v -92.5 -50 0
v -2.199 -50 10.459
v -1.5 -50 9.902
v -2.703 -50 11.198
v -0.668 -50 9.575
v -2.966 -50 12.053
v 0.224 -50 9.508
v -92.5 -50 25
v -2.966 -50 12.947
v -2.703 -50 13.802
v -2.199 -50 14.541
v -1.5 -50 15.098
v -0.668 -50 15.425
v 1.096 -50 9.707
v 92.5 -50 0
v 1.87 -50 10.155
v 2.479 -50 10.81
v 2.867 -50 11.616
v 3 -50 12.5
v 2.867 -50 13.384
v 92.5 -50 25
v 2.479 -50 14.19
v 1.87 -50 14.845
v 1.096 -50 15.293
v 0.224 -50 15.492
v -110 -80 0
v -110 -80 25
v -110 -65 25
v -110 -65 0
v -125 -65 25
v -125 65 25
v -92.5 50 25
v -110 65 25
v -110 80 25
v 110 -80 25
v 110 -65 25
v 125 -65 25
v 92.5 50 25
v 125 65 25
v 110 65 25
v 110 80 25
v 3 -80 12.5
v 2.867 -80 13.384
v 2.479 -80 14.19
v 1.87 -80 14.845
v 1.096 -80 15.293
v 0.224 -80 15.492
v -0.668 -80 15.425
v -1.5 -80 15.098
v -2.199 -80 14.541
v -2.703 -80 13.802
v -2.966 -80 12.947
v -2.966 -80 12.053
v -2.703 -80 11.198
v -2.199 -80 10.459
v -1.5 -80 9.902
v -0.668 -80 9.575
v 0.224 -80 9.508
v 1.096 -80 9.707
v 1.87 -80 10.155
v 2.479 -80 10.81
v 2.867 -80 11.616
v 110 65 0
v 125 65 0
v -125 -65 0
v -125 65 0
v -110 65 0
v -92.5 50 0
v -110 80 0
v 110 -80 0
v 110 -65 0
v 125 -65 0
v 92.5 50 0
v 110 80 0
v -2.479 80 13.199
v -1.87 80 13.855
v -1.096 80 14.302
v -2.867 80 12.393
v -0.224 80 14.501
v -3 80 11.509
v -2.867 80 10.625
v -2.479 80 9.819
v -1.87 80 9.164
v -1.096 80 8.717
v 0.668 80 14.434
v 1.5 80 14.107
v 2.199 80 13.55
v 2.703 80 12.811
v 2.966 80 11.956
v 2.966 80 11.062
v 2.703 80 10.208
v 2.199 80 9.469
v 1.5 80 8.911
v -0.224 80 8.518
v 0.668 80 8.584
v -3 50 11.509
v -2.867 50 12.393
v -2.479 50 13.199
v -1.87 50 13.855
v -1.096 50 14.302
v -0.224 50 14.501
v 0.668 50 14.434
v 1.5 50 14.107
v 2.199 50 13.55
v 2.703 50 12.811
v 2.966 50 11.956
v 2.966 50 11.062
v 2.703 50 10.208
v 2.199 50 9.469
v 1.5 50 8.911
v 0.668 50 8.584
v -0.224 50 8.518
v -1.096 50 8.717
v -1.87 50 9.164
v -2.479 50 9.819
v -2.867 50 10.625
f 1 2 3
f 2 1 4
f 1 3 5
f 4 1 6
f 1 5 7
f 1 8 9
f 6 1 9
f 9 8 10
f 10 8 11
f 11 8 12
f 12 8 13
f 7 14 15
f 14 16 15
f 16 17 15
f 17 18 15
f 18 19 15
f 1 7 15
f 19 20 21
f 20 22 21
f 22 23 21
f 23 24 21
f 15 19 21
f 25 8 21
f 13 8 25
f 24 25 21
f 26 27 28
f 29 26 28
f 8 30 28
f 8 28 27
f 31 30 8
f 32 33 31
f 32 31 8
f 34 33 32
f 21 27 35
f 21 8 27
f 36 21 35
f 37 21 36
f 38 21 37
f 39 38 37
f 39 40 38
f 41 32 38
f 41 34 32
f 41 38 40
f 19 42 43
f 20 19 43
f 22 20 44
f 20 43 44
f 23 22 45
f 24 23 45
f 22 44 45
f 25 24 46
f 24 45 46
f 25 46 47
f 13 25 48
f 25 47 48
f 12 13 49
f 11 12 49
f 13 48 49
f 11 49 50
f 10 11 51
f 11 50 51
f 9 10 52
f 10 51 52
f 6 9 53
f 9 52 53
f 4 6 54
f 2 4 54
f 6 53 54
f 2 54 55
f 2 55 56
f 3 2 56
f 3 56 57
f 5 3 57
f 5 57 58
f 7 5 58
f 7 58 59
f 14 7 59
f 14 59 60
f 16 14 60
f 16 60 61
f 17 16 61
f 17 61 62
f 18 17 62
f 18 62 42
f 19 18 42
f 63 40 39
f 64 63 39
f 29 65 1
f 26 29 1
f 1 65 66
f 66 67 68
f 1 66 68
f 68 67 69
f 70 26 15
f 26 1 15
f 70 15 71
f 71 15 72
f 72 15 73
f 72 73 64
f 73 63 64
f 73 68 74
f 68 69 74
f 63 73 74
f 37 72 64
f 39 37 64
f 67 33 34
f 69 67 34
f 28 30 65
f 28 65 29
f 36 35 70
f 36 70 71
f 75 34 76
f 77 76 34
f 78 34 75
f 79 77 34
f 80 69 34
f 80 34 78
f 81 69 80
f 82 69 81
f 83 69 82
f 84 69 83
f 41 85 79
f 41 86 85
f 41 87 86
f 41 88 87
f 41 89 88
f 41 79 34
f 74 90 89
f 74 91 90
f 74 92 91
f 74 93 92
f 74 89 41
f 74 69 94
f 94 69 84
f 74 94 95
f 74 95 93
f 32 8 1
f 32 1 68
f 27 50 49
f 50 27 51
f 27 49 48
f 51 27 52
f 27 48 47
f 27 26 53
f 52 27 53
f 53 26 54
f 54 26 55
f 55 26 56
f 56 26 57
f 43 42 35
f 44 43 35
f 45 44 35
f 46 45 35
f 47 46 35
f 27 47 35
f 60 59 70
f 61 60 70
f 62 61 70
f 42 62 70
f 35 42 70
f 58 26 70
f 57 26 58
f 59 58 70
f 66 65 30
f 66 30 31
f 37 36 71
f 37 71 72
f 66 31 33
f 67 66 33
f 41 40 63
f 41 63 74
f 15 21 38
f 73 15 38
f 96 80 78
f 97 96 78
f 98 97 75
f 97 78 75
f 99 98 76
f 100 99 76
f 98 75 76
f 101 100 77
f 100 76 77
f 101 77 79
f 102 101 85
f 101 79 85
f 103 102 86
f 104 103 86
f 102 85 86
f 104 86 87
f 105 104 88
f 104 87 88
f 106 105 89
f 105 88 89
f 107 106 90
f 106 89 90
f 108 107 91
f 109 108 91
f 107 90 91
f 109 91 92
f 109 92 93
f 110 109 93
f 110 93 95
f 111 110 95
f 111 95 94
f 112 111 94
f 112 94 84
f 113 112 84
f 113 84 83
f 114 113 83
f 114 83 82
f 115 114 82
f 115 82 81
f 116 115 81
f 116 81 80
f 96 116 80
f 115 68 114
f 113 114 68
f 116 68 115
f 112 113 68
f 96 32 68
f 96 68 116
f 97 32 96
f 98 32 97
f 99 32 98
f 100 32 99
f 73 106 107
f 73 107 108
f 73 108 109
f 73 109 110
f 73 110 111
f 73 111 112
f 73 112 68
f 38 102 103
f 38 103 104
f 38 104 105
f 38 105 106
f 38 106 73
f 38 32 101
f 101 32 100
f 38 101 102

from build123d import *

# Parameters (mm, degrees)
F0_W     = 250
F0_H     = 160
F1_DEPTH = 25
F2_W     = 15
F2_H     = 15
F3_DEPTH = 25
F4_W     = 185
F4_H     = 100
F5_DEPTH = 25
F6_R     = 3
F7_DEPTH = 40
F8_R     = 3
F9_DEPTH = 40


with BuildPart() as f1:
    # F0 (on Top) → F1 (new body)
    with BuildSketch(Plane.XY):
        Rectangle(F0_W, F0_H)
    extrude(amount=F1_DEPTH)

    # F2 (on face) → F3 (cut)
    with BuildSketch(Plane.XY.offset(25)):
        with Locations((-117.5, 72.5)):
            Rectangle(F2_W, F2_H)
        with Locations((117.5, 72.5)):
            Rectangle(F2_W, F2_H)
        with Locations((117.5, -72.5)):
            Rectangle(F2_W, F2_H)
        with Locations((-117.5, -72.5)):
            Rectangle(F2_W, F2_H)
    extrude(amount=-F3_DEPTH, mode=Mode.SUBTRACT)

    # F4 (on face) → F5 (cut)
    with BuildSketch(Plane.XY.offset(25)):
        Rectangle(F4_W, F4_H)
    extrude(amount=-F5_DEPTH, mode=Mode.SUBTRACT)

    # F6 (on face) → F7 (cut)
    with BuildSketch(Plane.XZ.offset(80)):
        with Locations((0, 12.5)):
            Circle(F6_R)
    extrude(amount=-F7_DEPTH, mode=Mode.SUBTRACT)

    # F8 (on face) → F9 (cut)
    with BuildSketch(Plane(origin=(0, 80, 0), x_dir=(-1, 0, 0), z_dir=(0, 1, 0))):
        with Locations((0, 11.509229)):
            Circle(F8_R)
    extrude(amount=-F9_DEPTH, mode=Mode.SUBTRACT)


solid = f1.part
